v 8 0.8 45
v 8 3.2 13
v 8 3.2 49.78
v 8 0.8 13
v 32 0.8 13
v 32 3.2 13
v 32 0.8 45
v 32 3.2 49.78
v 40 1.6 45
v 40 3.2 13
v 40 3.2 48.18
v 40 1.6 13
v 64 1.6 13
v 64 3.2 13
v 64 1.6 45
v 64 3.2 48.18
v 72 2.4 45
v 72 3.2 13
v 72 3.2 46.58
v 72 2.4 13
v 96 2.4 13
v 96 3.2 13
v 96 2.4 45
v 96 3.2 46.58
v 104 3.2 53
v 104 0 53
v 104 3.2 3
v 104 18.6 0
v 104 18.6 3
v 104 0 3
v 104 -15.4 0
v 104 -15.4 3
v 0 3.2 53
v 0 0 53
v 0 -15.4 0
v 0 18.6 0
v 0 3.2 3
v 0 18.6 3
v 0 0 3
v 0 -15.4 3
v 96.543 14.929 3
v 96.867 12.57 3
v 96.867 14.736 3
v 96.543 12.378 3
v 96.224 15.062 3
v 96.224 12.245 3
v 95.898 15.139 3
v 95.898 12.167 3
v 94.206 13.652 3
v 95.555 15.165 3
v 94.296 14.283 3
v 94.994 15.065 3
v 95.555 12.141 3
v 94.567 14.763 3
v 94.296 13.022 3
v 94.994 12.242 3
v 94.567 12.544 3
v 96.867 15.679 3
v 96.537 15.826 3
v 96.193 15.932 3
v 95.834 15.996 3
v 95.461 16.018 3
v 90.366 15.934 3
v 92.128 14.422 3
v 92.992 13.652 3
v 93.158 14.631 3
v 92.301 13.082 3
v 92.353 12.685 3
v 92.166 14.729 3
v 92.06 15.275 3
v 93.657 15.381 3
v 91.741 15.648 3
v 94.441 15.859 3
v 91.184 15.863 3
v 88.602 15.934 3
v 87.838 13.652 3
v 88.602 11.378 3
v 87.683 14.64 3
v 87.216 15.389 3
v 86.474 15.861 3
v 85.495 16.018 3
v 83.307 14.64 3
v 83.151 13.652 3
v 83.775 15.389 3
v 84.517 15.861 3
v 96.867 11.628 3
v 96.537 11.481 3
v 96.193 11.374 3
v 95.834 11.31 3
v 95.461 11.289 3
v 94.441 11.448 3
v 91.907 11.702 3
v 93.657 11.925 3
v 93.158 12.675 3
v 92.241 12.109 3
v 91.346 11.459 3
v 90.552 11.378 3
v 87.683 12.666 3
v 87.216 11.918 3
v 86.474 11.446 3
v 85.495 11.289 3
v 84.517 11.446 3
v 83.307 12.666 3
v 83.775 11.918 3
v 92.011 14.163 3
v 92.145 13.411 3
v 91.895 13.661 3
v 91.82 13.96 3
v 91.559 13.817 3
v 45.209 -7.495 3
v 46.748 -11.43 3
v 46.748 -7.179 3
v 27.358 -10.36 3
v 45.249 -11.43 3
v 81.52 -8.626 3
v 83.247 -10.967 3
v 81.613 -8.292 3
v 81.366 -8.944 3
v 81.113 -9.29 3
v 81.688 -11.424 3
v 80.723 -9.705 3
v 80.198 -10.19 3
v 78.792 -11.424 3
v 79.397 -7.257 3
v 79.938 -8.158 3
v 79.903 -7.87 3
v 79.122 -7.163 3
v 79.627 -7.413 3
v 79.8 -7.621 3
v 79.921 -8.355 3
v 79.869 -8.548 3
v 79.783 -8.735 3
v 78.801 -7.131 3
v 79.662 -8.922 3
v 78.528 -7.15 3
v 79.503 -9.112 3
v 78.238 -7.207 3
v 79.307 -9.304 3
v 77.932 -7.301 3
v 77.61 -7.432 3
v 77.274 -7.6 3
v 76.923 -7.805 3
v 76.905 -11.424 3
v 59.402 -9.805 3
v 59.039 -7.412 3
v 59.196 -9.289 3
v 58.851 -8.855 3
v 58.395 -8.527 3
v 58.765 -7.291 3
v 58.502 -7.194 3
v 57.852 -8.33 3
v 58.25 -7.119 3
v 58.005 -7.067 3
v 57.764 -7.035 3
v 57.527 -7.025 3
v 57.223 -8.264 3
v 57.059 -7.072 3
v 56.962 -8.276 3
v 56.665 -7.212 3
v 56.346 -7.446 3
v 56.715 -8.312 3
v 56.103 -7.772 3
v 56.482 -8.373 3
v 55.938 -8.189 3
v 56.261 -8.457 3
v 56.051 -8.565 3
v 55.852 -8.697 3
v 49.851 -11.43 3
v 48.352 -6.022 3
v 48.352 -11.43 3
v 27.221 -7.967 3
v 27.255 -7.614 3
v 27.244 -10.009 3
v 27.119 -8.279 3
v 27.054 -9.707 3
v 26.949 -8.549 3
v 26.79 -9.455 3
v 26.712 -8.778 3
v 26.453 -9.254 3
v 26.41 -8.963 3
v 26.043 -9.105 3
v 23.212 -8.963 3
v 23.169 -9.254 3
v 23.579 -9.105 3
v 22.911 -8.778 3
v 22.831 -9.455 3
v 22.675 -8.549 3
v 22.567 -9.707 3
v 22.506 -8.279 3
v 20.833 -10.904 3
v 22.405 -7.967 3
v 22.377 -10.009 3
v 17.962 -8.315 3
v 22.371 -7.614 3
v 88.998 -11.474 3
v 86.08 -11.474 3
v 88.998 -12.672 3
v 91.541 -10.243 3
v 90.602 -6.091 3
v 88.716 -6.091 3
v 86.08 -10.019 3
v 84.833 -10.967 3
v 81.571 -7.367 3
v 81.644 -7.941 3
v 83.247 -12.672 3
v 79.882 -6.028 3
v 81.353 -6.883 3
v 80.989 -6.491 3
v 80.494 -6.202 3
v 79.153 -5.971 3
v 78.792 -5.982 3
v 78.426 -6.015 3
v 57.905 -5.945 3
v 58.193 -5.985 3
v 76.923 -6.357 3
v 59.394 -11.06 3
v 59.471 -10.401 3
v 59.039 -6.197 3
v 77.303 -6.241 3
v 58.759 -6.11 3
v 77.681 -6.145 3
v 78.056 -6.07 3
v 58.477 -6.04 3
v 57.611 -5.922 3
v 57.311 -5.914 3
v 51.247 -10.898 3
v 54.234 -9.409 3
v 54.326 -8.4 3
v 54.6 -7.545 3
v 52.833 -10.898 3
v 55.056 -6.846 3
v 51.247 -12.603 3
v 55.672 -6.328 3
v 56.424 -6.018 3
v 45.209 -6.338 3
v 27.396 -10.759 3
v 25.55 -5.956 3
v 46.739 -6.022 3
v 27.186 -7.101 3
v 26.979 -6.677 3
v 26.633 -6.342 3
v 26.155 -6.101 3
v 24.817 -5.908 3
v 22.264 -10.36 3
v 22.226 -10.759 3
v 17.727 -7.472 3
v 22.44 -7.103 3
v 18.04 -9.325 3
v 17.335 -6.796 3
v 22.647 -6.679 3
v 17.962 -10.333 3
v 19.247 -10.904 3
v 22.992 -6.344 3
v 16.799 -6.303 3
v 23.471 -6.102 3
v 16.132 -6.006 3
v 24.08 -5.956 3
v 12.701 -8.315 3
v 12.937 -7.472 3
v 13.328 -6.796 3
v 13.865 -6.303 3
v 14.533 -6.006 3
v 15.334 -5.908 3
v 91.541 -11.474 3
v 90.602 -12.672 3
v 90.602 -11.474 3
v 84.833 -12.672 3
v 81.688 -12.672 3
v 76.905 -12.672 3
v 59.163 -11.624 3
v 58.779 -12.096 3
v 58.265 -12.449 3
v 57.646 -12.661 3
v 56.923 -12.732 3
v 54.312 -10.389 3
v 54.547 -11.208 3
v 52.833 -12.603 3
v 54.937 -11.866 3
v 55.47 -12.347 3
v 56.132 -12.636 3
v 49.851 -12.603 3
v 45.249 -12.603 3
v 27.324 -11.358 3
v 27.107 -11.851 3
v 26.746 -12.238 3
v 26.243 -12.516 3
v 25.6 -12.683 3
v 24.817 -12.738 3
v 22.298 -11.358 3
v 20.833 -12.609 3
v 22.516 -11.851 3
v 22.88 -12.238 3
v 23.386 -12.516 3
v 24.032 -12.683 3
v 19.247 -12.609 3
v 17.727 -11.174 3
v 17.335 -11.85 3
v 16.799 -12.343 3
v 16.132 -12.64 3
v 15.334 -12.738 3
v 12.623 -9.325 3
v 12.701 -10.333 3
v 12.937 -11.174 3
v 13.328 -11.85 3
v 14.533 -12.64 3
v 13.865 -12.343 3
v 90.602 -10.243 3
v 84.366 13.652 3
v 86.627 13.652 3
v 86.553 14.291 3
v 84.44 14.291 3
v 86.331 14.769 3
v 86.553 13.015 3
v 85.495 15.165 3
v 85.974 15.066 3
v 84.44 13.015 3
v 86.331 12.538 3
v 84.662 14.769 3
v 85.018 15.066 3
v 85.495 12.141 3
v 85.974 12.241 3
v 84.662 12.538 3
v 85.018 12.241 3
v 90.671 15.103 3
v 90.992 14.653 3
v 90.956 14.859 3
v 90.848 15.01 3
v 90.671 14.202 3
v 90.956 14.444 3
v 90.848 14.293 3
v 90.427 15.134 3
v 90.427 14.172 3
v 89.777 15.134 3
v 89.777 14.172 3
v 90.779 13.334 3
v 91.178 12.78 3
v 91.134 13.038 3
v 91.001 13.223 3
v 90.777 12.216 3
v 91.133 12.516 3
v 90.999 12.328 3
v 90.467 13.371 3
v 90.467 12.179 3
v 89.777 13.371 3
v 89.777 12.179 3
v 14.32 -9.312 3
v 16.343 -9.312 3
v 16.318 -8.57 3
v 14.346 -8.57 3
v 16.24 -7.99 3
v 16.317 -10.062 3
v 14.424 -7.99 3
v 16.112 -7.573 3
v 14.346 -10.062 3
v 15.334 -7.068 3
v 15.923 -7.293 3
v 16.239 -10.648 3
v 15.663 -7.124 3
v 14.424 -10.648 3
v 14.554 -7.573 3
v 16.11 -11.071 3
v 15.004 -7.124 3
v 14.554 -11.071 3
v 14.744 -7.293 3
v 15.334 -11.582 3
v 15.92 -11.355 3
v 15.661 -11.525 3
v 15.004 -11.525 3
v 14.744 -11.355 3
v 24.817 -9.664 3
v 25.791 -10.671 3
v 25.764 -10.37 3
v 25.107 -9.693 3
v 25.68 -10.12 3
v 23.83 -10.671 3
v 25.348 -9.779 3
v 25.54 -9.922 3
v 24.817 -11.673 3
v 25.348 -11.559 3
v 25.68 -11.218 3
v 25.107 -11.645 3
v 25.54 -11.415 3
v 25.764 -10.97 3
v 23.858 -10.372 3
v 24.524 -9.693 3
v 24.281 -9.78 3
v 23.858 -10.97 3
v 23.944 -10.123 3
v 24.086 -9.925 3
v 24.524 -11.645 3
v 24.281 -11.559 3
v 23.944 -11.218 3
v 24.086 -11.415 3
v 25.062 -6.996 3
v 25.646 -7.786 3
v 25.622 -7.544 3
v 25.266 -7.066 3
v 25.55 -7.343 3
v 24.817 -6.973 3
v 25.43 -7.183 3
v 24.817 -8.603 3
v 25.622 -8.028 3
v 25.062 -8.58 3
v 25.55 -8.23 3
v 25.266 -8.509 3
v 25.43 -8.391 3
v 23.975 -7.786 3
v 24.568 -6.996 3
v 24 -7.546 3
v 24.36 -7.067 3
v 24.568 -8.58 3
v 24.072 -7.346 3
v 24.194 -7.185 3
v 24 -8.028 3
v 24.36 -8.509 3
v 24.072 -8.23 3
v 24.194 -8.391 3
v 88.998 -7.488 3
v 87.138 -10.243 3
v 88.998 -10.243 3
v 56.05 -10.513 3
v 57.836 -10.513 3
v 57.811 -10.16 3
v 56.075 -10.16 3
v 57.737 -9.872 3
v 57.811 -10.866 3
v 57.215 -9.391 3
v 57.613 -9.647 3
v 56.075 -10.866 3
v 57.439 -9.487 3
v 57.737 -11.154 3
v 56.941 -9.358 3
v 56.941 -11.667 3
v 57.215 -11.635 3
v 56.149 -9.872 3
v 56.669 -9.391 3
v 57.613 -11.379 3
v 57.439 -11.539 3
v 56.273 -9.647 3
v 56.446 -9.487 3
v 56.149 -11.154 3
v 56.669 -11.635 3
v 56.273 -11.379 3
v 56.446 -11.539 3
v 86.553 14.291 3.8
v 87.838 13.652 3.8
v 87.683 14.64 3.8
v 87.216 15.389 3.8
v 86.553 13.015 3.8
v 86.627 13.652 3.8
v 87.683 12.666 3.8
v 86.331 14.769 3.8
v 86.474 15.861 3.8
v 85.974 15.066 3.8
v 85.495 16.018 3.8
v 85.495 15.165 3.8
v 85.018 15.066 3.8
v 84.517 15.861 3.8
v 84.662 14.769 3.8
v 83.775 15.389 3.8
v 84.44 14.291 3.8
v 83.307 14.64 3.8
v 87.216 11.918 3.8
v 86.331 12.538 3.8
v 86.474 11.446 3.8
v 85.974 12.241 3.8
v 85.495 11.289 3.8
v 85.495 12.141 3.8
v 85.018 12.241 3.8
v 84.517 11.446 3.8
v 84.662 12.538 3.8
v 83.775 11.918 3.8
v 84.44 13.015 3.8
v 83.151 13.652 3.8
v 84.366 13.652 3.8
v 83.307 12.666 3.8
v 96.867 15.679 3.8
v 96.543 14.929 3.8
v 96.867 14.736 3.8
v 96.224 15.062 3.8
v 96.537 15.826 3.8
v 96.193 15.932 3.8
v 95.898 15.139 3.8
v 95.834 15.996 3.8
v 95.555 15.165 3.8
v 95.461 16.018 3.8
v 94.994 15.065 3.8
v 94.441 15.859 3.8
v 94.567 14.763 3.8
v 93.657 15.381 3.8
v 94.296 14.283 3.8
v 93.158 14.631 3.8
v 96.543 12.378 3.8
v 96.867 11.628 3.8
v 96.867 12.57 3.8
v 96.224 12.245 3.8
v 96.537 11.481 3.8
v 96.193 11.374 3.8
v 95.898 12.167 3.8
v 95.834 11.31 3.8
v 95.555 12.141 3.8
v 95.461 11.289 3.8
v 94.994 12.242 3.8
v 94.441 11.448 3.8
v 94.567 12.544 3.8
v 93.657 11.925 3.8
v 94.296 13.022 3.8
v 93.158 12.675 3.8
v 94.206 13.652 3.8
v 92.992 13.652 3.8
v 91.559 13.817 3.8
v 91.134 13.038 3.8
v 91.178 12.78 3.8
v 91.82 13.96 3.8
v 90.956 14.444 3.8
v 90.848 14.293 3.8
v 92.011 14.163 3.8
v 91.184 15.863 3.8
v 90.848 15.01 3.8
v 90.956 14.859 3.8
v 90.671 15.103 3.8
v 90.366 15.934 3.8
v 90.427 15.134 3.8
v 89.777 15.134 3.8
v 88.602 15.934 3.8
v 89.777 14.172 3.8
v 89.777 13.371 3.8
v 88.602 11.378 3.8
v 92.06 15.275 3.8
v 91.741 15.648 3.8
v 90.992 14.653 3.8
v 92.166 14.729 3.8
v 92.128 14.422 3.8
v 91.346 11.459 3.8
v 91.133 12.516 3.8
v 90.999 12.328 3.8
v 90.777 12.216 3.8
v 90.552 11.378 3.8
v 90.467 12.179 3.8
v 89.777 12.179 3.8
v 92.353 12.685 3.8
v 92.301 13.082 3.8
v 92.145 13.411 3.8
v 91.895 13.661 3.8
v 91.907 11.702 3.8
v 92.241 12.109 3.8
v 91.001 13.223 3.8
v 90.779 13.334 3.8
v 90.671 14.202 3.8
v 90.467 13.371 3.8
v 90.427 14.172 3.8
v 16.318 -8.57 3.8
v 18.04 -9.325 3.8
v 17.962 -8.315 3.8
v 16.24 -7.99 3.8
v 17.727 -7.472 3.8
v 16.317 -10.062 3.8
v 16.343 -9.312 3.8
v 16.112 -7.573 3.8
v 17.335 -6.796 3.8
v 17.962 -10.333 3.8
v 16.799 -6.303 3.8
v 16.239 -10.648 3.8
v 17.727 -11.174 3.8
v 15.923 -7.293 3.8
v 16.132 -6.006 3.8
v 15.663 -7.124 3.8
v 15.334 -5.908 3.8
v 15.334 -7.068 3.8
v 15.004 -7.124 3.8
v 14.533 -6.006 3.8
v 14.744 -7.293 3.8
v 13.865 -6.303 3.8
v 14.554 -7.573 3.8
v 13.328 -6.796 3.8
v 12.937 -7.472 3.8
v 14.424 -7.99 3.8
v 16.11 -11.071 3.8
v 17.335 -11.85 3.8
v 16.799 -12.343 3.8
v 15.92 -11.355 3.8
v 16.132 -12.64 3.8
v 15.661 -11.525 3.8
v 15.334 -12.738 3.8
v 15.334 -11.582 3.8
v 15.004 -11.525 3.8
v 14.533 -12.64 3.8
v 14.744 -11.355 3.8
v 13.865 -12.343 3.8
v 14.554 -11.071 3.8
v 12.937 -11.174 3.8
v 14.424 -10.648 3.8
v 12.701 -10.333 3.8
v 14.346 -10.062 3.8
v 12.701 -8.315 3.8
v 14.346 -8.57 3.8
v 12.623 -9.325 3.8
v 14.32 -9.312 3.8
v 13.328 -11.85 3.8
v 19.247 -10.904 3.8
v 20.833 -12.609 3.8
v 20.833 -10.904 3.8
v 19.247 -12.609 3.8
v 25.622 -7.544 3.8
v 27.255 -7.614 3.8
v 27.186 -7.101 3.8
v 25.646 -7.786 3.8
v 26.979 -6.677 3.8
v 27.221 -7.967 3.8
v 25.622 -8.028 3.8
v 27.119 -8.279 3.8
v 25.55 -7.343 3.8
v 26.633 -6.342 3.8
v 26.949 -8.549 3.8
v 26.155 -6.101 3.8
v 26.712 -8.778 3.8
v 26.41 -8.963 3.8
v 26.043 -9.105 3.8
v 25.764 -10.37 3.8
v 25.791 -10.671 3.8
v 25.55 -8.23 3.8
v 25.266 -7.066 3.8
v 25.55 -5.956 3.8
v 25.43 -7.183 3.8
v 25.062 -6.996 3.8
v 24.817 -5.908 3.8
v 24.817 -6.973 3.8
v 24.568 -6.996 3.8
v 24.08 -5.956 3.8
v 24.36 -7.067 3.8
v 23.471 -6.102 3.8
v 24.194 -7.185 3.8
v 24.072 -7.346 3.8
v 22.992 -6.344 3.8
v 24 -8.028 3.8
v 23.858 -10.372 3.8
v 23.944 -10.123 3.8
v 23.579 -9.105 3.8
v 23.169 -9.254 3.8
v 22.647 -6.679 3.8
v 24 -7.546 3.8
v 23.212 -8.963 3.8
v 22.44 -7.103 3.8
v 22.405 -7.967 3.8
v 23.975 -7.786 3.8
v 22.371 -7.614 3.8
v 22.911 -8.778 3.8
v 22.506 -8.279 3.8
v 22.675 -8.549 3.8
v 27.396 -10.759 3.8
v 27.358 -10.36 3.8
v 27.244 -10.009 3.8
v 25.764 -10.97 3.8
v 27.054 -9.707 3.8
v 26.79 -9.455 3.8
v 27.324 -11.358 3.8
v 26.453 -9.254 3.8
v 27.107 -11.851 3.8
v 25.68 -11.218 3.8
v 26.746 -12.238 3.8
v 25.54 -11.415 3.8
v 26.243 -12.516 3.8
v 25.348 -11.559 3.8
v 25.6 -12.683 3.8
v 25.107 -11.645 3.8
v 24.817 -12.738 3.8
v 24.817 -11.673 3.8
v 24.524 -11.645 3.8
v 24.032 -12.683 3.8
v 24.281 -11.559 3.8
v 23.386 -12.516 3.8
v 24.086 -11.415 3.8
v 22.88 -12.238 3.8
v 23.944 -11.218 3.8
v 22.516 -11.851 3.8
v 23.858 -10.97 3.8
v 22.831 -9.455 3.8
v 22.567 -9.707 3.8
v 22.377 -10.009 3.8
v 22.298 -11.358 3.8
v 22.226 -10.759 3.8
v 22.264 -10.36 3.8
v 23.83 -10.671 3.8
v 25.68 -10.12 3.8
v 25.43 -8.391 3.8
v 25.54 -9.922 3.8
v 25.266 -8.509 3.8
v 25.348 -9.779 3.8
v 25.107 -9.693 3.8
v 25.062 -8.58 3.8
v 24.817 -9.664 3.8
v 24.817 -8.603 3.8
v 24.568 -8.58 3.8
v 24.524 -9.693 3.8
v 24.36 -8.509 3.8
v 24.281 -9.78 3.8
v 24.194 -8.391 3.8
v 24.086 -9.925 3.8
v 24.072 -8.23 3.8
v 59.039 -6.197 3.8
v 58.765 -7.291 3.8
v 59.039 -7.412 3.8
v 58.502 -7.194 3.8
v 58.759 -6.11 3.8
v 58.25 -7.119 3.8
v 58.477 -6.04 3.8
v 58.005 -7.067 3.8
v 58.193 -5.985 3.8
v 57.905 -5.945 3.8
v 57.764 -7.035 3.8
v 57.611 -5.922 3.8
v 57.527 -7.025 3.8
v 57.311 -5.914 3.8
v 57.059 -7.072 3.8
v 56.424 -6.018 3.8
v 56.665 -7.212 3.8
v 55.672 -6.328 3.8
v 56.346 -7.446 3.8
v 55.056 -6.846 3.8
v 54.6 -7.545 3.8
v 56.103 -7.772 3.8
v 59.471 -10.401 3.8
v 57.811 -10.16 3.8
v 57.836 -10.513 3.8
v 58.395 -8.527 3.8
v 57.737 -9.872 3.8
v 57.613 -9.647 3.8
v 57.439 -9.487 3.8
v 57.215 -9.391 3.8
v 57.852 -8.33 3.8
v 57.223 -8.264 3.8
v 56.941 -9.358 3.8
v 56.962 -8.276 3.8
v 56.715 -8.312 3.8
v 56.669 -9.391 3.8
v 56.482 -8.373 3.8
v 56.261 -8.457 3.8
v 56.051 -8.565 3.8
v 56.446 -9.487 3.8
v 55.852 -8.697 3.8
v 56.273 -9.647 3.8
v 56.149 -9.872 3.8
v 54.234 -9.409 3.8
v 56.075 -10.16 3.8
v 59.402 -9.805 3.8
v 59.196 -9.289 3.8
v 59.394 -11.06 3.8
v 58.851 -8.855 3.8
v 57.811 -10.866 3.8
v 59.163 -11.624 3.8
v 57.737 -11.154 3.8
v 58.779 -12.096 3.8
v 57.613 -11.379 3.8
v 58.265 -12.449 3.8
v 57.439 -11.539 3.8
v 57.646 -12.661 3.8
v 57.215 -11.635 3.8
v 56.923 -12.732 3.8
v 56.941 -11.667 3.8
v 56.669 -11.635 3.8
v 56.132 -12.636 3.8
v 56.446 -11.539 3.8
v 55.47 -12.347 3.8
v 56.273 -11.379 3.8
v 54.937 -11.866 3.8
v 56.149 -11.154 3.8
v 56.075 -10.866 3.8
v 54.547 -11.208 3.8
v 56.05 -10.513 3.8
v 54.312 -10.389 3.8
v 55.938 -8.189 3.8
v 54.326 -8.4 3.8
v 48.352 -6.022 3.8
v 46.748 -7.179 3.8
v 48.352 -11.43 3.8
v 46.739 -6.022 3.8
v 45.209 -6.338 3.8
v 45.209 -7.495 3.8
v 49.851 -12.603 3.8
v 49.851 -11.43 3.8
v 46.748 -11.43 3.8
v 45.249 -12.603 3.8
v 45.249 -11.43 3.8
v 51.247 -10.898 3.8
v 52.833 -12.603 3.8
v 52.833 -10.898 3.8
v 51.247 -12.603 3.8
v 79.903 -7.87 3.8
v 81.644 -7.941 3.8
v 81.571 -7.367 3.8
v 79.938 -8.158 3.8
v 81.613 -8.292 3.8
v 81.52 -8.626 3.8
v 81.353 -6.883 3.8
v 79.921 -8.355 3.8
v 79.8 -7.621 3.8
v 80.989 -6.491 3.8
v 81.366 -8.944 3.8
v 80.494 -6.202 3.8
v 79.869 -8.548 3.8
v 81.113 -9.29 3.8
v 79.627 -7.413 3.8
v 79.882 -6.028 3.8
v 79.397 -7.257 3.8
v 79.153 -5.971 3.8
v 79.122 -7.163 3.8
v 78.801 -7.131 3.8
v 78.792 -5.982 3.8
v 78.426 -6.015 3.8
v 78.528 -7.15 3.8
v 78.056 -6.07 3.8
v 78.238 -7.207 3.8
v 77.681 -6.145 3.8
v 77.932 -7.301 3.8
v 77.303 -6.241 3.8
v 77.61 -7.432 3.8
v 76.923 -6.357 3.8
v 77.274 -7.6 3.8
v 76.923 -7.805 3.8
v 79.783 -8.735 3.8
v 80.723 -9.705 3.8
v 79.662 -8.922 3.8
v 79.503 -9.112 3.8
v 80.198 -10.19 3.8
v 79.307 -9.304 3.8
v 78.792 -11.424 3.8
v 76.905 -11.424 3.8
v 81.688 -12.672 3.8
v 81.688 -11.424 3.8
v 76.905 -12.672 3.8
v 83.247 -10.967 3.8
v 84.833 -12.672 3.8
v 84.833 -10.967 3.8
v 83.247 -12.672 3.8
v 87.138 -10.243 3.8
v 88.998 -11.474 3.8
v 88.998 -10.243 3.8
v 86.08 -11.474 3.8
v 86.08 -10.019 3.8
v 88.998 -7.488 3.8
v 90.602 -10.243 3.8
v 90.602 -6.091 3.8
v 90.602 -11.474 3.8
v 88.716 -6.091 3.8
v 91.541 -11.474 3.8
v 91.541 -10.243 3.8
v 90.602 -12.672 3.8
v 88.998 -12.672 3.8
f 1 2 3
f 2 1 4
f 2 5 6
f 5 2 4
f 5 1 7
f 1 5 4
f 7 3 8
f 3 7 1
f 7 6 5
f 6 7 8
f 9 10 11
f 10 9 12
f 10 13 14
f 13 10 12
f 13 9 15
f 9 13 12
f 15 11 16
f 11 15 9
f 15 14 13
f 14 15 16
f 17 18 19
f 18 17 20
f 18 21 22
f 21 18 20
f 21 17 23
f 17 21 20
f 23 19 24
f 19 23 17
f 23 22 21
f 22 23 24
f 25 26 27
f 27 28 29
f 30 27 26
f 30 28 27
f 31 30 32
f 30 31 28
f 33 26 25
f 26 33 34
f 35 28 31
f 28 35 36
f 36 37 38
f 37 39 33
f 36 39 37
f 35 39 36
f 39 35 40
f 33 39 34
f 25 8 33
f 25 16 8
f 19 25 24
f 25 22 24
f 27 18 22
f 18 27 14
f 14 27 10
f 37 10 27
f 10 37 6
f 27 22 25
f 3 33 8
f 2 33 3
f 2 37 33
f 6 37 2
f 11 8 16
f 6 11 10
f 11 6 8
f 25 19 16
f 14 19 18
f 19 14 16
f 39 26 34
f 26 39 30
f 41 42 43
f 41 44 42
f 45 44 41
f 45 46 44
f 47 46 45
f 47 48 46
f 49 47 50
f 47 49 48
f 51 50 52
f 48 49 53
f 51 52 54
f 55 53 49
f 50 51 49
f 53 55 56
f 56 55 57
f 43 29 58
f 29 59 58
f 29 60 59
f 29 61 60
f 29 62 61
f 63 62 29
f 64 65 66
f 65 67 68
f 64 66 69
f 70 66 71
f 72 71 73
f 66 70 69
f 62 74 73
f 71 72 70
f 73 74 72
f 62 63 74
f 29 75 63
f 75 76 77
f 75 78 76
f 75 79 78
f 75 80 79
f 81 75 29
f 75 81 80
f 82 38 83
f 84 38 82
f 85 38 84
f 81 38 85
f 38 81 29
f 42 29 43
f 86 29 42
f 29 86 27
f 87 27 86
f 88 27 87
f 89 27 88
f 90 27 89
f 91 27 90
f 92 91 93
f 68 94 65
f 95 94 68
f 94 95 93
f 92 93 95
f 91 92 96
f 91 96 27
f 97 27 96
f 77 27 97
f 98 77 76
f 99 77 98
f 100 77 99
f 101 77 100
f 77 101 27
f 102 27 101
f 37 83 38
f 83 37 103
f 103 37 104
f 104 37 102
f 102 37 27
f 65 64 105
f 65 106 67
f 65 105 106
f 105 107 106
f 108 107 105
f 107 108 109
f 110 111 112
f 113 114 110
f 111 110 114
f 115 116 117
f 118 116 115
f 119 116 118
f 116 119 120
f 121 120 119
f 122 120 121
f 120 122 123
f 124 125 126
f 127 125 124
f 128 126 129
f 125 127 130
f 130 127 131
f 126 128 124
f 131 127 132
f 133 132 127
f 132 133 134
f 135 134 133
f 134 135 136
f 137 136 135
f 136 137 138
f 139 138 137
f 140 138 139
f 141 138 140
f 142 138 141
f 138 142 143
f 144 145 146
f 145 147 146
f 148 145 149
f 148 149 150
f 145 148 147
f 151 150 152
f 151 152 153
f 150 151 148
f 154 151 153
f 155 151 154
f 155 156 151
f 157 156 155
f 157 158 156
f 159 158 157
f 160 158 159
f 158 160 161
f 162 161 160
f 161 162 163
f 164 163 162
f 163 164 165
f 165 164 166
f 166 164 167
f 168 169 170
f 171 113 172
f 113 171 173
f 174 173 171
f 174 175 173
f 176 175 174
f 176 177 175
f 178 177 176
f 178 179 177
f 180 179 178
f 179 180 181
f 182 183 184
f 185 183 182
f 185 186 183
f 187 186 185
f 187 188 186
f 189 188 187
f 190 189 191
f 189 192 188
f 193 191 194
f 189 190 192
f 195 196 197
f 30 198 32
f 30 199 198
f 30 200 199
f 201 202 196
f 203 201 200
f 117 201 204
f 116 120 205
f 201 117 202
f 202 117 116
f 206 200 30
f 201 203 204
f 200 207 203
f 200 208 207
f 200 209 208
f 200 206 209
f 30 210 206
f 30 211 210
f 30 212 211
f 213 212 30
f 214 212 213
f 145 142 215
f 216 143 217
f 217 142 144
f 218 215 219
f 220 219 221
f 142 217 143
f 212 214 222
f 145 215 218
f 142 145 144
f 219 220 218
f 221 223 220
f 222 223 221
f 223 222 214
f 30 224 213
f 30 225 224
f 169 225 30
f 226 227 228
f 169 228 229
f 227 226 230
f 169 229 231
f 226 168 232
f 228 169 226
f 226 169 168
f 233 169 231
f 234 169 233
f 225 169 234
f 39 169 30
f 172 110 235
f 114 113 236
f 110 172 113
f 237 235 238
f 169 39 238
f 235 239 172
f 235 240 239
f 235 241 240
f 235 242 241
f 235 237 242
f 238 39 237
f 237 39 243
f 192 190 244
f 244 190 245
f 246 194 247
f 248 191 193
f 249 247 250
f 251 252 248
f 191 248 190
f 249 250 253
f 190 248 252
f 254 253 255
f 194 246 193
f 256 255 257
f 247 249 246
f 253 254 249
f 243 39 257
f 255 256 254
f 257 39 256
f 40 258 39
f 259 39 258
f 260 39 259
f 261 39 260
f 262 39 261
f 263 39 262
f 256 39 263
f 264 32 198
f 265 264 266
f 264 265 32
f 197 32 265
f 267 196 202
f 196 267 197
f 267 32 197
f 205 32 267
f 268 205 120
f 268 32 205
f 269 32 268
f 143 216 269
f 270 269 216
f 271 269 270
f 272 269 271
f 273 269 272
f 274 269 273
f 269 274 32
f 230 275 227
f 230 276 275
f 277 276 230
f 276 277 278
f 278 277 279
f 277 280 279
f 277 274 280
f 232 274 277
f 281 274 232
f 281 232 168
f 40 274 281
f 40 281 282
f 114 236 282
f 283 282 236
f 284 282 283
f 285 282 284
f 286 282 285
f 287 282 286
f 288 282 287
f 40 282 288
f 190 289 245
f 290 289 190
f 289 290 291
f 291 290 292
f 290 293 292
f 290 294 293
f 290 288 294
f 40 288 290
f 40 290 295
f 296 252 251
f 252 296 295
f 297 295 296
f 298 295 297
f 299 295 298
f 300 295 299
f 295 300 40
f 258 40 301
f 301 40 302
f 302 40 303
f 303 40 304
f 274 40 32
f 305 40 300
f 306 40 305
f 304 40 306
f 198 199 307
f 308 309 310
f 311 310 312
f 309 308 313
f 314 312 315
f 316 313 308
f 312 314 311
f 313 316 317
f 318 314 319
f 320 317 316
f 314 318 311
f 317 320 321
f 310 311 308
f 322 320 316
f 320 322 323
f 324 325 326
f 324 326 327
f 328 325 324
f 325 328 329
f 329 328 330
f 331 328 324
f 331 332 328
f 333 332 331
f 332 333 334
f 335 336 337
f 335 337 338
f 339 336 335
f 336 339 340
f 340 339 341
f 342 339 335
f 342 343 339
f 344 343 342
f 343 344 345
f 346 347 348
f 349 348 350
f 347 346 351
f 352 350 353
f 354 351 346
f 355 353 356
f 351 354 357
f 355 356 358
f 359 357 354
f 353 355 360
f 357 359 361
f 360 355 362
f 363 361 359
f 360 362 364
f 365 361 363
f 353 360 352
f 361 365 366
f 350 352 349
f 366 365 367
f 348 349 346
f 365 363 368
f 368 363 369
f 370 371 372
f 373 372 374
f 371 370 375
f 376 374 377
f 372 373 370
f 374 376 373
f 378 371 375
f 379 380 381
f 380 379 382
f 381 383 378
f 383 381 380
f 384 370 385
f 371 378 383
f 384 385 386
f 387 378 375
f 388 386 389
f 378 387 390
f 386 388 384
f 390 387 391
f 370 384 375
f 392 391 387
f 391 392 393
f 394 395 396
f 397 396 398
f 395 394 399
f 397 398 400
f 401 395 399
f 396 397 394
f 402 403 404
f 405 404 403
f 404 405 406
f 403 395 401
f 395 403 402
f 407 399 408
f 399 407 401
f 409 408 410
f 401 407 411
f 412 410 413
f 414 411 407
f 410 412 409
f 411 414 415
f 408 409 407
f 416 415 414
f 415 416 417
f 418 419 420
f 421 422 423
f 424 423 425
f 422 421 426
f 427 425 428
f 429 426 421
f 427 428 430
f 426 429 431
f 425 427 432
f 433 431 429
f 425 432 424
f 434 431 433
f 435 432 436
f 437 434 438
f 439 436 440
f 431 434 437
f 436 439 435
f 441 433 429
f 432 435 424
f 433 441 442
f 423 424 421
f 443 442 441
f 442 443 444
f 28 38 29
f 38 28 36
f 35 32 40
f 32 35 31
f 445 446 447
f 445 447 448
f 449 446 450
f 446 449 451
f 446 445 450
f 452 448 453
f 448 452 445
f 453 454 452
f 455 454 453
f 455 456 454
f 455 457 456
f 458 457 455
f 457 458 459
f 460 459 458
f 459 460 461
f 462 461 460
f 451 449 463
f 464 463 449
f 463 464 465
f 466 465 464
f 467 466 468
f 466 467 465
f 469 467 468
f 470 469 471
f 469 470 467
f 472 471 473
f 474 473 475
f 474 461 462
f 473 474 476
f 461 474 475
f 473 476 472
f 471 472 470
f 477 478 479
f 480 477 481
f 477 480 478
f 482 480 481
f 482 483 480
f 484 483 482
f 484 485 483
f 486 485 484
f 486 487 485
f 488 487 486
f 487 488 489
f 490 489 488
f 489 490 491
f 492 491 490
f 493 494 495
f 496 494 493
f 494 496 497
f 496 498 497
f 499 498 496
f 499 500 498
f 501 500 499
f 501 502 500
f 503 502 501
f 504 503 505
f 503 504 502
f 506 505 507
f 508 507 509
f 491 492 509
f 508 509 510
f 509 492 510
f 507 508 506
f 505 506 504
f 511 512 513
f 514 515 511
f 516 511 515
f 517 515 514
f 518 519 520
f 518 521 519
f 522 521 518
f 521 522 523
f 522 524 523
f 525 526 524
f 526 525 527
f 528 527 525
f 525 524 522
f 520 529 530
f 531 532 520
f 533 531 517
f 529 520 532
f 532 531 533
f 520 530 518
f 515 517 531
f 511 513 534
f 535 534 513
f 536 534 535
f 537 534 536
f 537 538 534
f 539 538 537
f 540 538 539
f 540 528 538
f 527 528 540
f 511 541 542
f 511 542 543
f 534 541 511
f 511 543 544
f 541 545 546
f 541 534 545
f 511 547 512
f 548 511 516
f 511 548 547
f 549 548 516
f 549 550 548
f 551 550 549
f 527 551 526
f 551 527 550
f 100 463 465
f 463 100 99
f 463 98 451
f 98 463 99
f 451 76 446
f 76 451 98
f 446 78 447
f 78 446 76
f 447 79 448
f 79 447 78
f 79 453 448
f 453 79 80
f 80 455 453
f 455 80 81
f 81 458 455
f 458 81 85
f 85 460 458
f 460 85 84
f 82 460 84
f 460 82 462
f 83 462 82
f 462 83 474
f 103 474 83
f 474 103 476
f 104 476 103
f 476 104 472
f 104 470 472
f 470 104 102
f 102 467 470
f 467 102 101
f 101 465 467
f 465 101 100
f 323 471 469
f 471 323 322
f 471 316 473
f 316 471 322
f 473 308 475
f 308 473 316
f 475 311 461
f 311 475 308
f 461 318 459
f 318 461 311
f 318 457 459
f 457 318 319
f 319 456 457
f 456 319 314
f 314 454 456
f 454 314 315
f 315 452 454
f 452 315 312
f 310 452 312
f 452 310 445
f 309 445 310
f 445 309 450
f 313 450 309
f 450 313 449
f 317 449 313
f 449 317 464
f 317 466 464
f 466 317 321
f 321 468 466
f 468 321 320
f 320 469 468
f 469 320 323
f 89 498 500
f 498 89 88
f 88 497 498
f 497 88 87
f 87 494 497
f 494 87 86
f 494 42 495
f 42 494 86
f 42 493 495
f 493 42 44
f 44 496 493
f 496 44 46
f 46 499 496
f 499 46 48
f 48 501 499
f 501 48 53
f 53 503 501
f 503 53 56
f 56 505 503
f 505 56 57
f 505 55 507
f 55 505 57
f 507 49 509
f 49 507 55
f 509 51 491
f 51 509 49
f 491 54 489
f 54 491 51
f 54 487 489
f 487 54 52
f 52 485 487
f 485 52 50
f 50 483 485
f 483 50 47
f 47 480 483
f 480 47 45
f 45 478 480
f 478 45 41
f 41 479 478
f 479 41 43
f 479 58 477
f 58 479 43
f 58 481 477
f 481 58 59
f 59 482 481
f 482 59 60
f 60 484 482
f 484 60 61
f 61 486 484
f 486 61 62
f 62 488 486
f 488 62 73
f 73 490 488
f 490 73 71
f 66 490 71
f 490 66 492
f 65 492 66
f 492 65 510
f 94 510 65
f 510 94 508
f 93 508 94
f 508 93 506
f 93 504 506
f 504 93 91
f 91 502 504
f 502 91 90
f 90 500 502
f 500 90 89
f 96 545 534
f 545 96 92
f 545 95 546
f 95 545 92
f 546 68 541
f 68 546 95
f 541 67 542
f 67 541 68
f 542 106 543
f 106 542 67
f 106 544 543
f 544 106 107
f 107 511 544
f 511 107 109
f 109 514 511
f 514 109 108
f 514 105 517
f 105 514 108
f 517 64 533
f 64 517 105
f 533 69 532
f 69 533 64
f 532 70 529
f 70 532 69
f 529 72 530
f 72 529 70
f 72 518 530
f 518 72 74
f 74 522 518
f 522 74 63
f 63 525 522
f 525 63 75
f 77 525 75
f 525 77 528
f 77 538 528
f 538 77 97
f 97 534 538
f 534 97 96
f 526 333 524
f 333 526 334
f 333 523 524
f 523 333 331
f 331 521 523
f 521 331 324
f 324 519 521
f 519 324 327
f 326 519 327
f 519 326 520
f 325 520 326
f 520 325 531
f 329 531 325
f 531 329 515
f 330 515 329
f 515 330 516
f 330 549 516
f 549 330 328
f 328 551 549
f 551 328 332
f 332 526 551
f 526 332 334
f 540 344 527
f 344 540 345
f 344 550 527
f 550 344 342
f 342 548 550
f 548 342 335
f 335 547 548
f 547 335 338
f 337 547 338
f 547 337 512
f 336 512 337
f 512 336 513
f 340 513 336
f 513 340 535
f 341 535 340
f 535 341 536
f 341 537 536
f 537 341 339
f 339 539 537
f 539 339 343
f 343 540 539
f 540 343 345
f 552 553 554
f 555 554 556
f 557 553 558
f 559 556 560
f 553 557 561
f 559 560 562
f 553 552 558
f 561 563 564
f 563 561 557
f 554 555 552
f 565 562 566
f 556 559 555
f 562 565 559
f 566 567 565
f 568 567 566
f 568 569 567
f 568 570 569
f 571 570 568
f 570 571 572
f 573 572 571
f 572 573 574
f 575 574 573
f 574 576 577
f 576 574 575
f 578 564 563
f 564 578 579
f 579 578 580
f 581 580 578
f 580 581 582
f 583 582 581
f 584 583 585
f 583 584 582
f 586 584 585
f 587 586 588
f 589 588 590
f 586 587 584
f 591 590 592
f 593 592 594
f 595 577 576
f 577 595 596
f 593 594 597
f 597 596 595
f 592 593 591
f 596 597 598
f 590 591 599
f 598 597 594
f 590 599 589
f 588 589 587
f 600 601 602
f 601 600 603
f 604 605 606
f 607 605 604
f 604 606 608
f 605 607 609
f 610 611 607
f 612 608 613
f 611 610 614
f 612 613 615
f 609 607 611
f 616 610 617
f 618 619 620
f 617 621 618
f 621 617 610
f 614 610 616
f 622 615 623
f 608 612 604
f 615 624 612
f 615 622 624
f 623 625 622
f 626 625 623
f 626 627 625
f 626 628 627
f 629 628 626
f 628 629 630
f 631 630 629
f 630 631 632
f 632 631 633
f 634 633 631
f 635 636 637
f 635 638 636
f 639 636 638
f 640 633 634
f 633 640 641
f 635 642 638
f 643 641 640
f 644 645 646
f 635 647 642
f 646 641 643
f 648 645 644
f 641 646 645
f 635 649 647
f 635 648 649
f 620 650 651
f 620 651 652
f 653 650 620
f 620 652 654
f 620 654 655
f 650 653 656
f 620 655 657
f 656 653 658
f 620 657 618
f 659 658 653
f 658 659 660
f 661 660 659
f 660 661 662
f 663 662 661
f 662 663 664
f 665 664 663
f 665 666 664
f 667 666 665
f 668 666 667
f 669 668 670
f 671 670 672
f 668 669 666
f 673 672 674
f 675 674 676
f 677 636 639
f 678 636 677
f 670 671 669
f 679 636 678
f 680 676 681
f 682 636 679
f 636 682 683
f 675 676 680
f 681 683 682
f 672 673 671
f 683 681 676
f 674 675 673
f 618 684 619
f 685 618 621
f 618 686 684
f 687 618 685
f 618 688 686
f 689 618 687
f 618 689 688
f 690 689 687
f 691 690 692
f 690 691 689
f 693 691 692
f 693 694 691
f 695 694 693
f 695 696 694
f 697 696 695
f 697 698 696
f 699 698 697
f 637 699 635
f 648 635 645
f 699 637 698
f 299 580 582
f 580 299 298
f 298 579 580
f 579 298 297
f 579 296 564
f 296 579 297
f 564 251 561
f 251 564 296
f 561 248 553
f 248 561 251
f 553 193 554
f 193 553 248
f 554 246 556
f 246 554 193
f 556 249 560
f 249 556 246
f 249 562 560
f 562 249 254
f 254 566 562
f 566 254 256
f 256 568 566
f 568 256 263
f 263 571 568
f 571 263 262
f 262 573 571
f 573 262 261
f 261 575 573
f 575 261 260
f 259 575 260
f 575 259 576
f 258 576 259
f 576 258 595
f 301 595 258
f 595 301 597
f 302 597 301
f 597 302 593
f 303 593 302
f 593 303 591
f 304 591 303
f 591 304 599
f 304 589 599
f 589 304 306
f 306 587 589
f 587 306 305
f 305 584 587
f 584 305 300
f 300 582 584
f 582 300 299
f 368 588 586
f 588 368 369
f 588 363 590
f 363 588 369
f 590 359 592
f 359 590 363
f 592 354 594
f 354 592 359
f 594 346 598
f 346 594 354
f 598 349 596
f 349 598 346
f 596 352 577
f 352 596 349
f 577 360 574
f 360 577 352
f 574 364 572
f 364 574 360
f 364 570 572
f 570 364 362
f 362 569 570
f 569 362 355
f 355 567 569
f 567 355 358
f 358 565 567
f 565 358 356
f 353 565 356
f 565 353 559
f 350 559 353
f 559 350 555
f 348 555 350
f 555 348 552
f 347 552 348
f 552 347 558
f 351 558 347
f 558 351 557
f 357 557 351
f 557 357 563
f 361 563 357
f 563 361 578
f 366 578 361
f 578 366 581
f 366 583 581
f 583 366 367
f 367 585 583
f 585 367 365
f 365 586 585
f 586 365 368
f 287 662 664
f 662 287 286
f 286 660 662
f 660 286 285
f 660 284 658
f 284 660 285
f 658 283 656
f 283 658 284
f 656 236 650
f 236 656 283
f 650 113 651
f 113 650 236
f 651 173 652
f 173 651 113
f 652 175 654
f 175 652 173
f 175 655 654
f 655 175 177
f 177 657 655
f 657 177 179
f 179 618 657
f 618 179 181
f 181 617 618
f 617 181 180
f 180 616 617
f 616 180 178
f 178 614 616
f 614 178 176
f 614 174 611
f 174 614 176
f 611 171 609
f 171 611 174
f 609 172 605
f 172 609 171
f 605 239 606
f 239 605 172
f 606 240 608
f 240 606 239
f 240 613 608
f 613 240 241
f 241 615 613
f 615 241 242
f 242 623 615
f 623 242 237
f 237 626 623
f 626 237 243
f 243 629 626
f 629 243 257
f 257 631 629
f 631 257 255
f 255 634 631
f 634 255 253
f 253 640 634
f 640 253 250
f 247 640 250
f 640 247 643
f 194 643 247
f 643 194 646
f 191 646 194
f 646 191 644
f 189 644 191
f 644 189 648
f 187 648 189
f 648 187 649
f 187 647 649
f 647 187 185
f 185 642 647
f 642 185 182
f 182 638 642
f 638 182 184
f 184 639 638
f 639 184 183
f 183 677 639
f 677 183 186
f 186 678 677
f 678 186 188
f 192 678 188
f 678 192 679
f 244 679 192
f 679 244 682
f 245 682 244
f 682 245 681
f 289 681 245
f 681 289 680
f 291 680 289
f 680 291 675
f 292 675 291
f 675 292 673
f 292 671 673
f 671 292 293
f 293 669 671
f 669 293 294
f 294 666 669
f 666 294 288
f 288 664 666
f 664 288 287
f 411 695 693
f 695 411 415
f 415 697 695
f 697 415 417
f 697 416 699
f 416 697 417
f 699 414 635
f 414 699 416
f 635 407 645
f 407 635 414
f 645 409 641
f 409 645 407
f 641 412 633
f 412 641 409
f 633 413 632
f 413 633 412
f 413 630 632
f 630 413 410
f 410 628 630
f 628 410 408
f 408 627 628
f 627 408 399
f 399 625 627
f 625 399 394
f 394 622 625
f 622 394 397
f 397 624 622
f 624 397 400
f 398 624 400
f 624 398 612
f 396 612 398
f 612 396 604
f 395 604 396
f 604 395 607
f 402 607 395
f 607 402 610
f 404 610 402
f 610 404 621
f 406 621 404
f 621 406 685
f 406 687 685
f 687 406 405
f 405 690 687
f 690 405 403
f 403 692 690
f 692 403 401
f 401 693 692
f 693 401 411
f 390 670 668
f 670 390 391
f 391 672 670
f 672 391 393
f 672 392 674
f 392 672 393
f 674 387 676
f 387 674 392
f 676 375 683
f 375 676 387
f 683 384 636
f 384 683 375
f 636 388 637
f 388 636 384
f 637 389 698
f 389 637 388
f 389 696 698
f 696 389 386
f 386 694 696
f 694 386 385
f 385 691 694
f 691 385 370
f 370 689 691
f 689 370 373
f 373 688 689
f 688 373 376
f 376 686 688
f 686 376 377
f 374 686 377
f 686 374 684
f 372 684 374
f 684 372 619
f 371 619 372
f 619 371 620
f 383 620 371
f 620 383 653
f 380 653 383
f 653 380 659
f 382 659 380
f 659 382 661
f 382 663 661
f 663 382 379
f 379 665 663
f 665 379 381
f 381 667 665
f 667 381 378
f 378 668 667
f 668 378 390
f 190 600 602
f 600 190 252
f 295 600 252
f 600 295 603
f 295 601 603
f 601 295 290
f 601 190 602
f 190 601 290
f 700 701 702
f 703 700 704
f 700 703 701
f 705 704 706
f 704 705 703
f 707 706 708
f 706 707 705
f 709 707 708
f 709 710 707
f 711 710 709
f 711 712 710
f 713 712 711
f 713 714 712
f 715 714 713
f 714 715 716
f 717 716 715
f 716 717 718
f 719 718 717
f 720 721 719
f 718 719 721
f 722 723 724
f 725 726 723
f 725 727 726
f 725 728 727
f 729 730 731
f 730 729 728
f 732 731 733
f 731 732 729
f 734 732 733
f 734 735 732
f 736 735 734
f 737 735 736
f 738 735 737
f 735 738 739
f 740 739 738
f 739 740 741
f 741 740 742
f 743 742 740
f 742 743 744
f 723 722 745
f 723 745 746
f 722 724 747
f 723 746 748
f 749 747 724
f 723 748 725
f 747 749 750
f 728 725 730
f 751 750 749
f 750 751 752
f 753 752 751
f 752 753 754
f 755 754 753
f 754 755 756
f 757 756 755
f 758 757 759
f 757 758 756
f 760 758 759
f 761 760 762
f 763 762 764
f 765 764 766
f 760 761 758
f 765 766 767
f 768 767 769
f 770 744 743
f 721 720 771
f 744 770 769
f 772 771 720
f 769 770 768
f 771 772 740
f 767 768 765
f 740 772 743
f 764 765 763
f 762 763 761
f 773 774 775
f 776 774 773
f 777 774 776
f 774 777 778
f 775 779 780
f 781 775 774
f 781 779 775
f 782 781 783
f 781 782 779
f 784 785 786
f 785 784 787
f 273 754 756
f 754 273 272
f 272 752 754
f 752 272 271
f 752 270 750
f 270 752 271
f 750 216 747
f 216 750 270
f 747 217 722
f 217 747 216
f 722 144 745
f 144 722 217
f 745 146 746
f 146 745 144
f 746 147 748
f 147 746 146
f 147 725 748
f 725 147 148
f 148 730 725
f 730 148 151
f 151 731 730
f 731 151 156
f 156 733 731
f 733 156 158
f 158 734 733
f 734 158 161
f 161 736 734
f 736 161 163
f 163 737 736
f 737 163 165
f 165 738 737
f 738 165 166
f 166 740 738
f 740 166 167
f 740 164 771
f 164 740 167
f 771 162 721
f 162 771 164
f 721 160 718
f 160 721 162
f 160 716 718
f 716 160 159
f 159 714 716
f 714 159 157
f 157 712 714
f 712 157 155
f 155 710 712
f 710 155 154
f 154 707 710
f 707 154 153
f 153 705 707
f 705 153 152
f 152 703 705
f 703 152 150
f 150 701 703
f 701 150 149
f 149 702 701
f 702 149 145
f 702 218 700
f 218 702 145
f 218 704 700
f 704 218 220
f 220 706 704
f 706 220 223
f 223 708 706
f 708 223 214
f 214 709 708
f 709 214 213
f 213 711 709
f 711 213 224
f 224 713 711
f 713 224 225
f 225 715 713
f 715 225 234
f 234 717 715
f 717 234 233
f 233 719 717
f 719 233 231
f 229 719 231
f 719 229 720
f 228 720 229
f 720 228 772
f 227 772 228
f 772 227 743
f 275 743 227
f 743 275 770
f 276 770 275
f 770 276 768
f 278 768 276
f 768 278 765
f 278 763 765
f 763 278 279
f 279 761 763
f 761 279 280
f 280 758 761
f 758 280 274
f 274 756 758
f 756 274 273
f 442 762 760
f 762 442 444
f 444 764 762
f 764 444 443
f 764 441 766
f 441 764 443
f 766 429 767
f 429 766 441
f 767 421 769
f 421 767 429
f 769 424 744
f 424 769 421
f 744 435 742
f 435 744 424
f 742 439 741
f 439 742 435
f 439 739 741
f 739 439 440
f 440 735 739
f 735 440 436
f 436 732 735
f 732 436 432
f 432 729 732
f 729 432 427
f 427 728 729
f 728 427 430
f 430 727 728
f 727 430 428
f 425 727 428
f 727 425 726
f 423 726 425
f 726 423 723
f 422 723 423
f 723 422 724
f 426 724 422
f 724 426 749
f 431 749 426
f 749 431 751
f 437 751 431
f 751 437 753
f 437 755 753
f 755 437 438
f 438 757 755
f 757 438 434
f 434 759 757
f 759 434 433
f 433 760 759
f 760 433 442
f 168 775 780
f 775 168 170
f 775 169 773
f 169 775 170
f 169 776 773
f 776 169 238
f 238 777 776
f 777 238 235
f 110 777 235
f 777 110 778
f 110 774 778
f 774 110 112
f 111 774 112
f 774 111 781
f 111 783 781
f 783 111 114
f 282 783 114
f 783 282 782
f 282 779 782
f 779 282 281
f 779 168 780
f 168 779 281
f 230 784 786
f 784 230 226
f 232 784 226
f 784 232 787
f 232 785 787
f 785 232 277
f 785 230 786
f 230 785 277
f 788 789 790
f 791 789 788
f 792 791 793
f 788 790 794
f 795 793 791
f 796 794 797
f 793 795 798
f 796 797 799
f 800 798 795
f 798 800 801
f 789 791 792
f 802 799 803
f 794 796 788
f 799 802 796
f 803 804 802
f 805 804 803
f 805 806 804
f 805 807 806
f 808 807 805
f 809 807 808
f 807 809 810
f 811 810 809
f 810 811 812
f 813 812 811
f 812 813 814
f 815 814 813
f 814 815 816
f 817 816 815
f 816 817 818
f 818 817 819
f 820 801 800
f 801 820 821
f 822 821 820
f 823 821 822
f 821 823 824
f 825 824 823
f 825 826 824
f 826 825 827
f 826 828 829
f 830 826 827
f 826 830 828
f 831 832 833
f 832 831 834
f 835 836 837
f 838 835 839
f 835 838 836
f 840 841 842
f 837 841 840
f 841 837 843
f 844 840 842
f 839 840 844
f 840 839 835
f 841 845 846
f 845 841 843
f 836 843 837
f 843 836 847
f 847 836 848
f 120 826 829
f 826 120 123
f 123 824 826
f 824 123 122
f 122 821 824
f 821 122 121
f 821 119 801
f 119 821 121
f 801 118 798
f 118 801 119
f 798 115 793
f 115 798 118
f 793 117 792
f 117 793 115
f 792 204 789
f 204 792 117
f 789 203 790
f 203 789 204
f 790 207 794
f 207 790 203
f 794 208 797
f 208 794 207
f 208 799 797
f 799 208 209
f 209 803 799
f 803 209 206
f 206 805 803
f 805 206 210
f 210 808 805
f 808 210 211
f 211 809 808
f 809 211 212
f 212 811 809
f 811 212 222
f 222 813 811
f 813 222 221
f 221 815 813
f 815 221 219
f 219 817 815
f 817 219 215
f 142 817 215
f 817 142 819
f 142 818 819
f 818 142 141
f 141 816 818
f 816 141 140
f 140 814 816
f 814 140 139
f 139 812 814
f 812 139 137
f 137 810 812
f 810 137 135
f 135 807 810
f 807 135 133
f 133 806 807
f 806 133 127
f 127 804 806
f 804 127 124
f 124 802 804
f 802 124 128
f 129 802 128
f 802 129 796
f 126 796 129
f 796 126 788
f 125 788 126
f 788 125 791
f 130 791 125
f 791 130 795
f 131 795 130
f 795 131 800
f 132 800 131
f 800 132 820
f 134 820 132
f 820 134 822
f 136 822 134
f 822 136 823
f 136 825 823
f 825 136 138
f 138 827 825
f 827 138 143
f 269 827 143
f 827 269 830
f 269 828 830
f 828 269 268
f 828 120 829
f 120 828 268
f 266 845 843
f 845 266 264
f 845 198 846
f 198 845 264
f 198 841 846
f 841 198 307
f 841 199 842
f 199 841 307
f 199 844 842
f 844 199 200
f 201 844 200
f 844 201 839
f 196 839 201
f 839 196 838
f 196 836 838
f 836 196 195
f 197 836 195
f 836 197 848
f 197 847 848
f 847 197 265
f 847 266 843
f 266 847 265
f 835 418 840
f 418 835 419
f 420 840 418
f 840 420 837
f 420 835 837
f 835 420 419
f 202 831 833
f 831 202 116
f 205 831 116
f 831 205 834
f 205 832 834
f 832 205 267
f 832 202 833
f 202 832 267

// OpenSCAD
// Window glow coupon, for Explained Lesson 005 "Why our windows are 0.8 mm thin" (2026-11-20).
// The lesson has been held since Nov 11 for one real photo: three windows at 0.8 / 1.6 / 2.4 mm
// lit from behind by one tea light. This prints them side by side, standing up the way our house
// walls do, so the pane's thickness is laid down by the wall's perimeters, as on a real house.
// Print in white PLA. Stand it on the table with the tea light behind the windows.

PANES  = [0.8, 1.6, 2.4];   // pane thickness, mm: two, four and six 0.4 mm lines
WALL   = 3.2;               // the frame around the windows
WIN_W  = 24;                // each window opening
WIN_H  = 32;
GAP    = 8;                 // frame between windows
SIDE   = 8;
TOP    = 8;
SILL   = 10;                // frame below the windows, above the foot
FOOT_D = 34;                // foot depth, so it stands on its own
FOOT_H = 3;
LABEL  = 0.8;               // label height, raised on the foot (4 layers)

n = len(PANES);
W = 2 * SIDE + n * WIN_W + (n - 1) * GAP;
H = FOOT_H + SILL + WIN_H + TOP;
function wx(i) = SIDE + i * (WIN_W + GAP);

module wall() {
    difference() {
        cube([W, WALL, H]);
        // each window is a pocket from the back, leaving the pane at the front face. The
        // pocket's ceiling slopes up toward the back, about 63 deg from flat: a flat one is a 24 mm bridge.
        for (i = [0 : n - 1]) pocket(i);
    }
}

module pocket(i) {
    d = WALL - PANES[i];
    z0 = FOOT_H + SILL;
    // the pocket's section in Y-Z, extruded along X across the window
    translate([wx(i), 0, 0]) rotate([90, 0, 90]) linear_extrude(WIN_W)
        polygon([[PANES[i], z0], [WALL + 0.01, z0], [WALL + 0.01, z0 + WIN_H + 2 * d], [PANES[i], z0 + WIN_H]]);
}

// the panes alone, declared to the gate as the thin feature under test
module panes() {
    for (i = [0 : n - 1]) translate([wx(i) - 1, -0.01, FOOT_H + SILL - 1]) cube([WIN_W + 2, PANES[i] + 0.02, WIN_H + 2]);
}

module foot() {
    // centred under the wall, so the coupon stands without tipping
    translate([0, -(FOOT_D - WALL) / 2, 0]) cube([W, FOOT_D, FOOT_H]);
}

module labels() {
    for (i = [0 : n - 1])
        translate([wx(i) + WIN_W / 2, -(FOOT_D - WALL) / 2 + 6, FOOT_H])
            linear_extrude(LABEL)
                text(str(PANES[i]), size = 6.5, font = "Montserrat:style=Bold", halign = "center", valign = "center");
}

module obc() {
    // maker's mark on the back of the foot
    translate([W - 14, WALL + (FOOT_D - WALL) / 2 - 5, FOOT_H])
        linear_extrude(LABEL) text("OBC", size = 4.5, font = "Montserrat:style=Bold", halign = "center", valign = "center");
}

part = "all";
if (part == "body" || part == "all") { wall(); foot(); obc(); }
if (part == "labels" || part == "all") labels();
if (part == "panes") panes();
